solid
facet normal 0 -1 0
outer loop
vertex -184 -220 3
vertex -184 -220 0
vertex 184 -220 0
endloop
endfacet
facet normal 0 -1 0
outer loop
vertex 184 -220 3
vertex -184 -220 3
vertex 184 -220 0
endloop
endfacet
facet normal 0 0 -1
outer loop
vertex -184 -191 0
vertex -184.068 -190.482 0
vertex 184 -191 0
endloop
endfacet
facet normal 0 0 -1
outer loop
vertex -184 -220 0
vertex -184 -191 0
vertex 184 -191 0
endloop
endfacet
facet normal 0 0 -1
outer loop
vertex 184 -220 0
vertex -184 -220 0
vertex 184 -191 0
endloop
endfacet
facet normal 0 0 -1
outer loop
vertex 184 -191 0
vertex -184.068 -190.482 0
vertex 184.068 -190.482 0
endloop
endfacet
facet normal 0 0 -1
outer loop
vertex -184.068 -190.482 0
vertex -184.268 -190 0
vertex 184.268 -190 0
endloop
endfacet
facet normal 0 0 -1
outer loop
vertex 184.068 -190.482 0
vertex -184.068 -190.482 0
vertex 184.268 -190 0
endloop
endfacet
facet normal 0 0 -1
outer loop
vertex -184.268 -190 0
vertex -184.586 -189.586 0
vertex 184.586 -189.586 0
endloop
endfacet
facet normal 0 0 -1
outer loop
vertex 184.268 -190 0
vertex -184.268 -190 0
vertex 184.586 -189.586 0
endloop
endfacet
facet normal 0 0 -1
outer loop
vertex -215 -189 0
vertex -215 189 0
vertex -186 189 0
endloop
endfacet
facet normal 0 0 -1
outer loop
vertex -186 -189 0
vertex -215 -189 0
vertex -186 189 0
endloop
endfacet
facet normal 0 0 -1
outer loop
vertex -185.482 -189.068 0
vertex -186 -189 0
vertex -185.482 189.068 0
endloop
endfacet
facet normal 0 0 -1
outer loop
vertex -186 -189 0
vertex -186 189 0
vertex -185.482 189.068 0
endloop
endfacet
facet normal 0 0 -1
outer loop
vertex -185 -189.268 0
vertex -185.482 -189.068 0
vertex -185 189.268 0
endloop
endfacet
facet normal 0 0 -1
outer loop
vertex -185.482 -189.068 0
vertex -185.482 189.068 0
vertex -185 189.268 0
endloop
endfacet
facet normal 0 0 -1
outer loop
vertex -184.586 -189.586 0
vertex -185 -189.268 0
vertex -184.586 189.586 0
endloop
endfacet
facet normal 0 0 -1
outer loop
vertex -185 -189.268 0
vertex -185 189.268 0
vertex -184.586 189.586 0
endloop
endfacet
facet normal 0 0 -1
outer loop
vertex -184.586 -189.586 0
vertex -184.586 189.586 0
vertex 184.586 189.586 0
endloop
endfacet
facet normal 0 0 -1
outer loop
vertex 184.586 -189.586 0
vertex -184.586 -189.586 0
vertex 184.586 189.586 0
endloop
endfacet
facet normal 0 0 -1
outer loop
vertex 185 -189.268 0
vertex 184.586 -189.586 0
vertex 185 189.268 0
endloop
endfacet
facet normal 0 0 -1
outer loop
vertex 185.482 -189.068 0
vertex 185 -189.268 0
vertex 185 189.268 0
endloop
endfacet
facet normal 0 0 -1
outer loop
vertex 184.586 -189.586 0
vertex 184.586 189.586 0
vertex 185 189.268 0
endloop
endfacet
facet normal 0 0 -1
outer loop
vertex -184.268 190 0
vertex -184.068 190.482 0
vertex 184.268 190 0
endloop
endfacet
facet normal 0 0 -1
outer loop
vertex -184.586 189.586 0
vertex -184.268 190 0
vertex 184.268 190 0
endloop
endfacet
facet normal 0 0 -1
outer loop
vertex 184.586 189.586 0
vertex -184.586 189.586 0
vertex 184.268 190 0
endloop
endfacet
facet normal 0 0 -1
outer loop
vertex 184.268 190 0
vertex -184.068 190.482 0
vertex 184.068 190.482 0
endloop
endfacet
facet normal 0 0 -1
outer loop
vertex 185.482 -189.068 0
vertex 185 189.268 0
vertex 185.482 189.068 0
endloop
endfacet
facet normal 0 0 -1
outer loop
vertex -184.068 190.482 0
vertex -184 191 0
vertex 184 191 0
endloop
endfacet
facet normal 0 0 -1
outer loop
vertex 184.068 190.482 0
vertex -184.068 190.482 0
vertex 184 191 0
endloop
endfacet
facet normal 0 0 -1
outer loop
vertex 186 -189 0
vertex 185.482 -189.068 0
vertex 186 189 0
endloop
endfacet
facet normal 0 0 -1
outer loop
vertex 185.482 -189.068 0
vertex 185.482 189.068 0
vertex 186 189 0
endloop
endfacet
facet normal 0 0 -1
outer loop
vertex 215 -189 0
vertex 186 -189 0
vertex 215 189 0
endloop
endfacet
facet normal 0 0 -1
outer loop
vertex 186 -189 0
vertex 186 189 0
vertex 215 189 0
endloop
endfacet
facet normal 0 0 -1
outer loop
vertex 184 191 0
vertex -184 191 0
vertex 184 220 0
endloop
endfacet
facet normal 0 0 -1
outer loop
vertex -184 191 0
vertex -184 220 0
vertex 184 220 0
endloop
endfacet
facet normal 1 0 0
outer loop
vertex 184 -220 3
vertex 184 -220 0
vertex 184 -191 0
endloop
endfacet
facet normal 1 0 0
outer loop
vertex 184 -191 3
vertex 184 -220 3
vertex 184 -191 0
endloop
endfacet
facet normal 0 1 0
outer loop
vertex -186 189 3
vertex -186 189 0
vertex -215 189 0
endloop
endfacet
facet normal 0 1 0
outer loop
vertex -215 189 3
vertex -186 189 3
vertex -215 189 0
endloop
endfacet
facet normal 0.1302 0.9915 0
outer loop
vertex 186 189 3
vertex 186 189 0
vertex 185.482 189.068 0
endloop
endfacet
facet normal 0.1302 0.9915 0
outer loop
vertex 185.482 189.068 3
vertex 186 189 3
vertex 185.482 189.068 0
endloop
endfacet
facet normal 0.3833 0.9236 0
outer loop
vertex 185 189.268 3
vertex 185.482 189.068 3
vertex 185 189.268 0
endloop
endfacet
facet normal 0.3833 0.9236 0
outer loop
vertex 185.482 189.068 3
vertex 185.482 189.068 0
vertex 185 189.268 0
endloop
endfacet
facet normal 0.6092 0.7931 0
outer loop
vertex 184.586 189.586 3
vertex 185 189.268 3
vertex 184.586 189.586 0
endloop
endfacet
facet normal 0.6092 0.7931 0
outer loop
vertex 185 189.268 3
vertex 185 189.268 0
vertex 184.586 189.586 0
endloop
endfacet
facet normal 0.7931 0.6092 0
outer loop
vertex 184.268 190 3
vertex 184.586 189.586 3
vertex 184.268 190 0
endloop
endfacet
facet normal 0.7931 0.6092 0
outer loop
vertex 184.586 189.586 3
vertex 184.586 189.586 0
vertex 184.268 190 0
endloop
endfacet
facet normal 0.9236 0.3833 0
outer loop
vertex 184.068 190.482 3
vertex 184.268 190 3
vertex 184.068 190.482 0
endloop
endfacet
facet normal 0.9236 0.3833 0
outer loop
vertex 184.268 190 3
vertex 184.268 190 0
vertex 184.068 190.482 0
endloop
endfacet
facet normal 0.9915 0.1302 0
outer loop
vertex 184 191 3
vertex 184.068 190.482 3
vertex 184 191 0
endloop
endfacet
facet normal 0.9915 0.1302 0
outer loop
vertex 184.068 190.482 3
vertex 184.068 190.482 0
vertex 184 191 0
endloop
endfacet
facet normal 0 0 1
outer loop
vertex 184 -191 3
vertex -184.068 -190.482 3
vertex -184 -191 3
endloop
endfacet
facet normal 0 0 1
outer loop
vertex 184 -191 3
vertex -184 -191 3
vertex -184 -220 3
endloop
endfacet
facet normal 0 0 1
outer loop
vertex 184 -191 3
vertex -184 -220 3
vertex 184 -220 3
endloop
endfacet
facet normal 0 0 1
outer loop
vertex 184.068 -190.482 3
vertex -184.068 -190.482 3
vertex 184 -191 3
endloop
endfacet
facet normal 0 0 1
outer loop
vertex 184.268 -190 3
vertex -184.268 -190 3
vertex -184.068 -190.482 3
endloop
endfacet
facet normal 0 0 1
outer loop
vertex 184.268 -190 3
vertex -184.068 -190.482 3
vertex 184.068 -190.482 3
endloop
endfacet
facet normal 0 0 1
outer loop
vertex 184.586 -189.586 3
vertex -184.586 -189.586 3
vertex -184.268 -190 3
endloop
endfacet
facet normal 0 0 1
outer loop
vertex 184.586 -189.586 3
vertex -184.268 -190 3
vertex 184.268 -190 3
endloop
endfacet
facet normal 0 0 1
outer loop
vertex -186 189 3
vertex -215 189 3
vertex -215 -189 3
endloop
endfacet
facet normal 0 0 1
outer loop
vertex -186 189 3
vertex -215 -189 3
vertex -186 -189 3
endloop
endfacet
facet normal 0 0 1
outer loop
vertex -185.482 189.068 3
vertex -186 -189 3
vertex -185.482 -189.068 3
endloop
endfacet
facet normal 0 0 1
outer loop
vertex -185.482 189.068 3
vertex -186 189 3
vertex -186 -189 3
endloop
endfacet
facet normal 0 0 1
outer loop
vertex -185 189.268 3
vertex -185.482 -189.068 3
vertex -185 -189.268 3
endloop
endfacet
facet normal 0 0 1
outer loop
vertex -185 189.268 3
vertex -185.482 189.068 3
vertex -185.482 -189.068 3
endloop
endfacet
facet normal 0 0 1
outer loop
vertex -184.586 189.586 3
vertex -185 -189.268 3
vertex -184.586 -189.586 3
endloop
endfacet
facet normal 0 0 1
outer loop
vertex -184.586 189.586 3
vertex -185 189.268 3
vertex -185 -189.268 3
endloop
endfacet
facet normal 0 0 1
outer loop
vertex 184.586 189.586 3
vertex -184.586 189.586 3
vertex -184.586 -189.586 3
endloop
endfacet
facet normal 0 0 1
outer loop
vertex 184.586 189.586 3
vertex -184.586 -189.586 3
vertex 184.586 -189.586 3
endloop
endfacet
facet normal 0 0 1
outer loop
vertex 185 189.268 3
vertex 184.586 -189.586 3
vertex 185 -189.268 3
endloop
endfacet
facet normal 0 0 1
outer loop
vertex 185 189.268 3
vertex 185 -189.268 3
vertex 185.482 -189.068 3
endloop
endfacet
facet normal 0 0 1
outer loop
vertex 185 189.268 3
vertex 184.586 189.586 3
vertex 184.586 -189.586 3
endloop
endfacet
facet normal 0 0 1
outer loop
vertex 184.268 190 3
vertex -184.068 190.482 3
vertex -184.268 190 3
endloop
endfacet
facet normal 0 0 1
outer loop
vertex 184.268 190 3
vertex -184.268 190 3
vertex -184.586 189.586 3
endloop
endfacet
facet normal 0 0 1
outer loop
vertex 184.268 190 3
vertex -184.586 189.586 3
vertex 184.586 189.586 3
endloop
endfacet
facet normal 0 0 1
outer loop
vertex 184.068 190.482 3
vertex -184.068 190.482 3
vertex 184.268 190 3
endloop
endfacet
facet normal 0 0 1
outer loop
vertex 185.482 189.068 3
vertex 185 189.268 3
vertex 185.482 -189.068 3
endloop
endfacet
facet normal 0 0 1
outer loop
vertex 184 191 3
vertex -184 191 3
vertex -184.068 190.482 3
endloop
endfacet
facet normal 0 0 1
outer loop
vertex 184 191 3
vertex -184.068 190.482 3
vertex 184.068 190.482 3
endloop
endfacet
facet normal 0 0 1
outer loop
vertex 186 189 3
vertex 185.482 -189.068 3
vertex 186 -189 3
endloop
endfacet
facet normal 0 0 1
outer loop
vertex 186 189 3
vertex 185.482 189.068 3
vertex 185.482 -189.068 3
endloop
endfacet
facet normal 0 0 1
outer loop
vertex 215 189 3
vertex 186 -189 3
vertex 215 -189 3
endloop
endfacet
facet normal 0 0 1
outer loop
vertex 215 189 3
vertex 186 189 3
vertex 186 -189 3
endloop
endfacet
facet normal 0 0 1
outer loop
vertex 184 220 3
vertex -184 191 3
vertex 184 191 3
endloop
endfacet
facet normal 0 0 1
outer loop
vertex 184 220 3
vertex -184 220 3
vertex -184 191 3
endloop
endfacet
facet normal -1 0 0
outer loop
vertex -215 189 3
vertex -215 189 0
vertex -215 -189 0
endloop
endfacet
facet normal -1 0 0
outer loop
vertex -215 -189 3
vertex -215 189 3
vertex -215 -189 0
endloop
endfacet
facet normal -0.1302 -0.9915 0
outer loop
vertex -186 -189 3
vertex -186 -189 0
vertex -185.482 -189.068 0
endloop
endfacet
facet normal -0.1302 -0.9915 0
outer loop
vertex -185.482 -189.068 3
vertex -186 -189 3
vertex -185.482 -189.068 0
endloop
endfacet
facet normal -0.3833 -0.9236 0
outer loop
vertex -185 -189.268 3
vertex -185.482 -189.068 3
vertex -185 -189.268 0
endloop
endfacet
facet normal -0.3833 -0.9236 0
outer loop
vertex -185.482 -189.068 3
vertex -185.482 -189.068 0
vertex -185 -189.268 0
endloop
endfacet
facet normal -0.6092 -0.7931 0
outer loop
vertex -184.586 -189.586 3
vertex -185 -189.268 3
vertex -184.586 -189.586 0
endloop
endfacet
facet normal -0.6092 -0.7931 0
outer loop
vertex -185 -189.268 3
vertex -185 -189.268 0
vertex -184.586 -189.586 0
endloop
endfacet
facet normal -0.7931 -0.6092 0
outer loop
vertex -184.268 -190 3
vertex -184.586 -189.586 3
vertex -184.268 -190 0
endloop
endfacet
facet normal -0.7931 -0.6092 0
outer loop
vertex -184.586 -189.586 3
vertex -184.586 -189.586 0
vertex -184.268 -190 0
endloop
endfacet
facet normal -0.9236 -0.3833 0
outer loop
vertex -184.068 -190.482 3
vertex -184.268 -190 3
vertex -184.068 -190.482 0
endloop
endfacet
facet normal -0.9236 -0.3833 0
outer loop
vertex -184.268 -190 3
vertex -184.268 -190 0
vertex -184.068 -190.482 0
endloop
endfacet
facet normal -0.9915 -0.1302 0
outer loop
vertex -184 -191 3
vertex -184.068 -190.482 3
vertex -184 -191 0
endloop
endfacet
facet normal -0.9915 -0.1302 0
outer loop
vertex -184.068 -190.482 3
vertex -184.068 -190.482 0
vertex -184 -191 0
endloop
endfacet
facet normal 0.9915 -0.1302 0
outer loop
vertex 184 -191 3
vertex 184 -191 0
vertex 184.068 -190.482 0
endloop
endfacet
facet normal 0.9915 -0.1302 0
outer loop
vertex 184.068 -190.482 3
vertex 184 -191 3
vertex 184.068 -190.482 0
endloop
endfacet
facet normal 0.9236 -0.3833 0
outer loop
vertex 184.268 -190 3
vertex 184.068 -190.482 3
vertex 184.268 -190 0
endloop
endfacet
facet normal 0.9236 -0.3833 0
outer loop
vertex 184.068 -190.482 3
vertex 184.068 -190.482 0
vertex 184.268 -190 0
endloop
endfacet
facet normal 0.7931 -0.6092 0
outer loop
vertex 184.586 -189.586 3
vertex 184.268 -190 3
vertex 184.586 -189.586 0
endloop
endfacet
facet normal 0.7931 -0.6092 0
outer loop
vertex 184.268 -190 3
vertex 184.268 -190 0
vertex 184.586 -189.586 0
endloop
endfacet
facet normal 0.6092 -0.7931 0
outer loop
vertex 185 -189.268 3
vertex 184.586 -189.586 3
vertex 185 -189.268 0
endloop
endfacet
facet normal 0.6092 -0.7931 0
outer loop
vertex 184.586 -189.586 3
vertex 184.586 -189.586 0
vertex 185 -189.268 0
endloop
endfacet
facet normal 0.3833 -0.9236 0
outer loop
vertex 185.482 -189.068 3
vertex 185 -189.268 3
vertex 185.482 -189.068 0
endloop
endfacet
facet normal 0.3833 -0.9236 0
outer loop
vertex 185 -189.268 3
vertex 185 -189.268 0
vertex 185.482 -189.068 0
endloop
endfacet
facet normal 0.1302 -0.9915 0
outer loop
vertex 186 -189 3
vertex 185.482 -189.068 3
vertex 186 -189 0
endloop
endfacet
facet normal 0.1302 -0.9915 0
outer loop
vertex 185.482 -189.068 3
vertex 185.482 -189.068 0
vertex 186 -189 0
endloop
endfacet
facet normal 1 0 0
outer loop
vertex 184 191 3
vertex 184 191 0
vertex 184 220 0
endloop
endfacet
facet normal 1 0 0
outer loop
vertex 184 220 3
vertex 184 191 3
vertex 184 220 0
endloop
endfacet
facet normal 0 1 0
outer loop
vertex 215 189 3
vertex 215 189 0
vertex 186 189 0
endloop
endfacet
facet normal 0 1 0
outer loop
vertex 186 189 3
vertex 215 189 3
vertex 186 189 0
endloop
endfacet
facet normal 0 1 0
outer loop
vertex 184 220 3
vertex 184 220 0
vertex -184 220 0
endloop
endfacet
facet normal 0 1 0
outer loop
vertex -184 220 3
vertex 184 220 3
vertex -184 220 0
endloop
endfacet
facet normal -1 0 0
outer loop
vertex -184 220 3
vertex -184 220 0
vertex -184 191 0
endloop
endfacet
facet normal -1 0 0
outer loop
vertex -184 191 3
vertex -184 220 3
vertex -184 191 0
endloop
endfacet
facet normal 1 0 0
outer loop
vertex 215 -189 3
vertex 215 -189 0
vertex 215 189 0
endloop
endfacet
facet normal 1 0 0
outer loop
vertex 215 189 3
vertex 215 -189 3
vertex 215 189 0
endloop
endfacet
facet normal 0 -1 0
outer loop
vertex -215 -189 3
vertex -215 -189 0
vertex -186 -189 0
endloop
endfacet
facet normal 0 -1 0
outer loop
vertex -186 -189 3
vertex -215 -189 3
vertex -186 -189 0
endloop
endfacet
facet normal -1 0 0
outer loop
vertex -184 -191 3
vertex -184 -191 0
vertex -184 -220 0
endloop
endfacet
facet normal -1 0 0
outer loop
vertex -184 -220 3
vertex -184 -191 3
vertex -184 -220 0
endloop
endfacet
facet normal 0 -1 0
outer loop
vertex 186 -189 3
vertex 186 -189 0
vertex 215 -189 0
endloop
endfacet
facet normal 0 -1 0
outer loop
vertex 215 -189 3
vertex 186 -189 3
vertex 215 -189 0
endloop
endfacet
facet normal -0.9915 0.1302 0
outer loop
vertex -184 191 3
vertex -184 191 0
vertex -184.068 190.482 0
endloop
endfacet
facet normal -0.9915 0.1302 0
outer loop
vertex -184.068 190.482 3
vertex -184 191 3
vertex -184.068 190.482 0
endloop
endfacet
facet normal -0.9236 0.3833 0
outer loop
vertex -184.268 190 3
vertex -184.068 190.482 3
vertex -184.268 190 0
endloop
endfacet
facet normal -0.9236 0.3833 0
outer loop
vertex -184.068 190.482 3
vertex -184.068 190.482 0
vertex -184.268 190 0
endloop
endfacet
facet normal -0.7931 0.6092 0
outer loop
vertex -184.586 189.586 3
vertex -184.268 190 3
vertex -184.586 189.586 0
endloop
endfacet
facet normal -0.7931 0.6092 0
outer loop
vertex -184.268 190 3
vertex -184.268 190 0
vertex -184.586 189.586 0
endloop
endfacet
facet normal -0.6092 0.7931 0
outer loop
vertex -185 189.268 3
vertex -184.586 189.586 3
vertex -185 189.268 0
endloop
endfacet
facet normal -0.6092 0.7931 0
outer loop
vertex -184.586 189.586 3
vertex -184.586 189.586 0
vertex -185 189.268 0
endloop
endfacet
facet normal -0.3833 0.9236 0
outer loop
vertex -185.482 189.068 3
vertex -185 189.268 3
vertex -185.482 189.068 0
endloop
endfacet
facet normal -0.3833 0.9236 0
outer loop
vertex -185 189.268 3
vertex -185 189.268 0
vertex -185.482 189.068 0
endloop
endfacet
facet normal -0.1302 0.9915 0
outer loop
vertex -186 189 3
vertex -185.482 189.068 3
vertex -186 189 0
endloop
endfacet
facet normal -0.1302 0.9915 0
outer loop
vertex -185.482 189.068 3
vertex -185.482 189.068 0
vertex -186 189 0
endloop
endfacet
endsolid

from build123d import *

# Parameters (mm, degrees)
BOSS_EXTRUDE1_DEPTH = 3


with BuildPart() as part:
    # Sketch1 → Boss-Extrude1 (new body)
    with BuildSketch(Plane.XY):
        with BuildLine():
            Line((215, -189), (215, 189))
            Line((215, 189), (186, 189))
            ThreePointArc((186, 189), (184.585786438, 189.585786438), (184, 191))
            Line((184, 191), (184, 220))
            Line((184, 220), (-184, 220))
            Line((-184, 220), (-184, 191))
            ThreePointArc((-184, 191), (-184.585786438, 189.585786438), (-186, 189))
            Line((-186, 189), (-215, 189))
            Line((-215, 189), (-215, -189))
            Line((-215, -189), (-186, -189))
            ThreePointArc((-186, -189), (-184.585786438, -189.585786438), (-184, -191))
            Line((-184, -191), (-184, -220))
            Line((-184, -220), (184, -220))
            Line((184, -220), (184, -191))
            ThreePointArc((184, -191), (184.585786438, -189.585786438), (186, -189))
            Line((186, -189), (215, -189))
        make_face()
    extrude(amount=BOSS_EXTRUDE1_DEPTH)


solid = part.part
